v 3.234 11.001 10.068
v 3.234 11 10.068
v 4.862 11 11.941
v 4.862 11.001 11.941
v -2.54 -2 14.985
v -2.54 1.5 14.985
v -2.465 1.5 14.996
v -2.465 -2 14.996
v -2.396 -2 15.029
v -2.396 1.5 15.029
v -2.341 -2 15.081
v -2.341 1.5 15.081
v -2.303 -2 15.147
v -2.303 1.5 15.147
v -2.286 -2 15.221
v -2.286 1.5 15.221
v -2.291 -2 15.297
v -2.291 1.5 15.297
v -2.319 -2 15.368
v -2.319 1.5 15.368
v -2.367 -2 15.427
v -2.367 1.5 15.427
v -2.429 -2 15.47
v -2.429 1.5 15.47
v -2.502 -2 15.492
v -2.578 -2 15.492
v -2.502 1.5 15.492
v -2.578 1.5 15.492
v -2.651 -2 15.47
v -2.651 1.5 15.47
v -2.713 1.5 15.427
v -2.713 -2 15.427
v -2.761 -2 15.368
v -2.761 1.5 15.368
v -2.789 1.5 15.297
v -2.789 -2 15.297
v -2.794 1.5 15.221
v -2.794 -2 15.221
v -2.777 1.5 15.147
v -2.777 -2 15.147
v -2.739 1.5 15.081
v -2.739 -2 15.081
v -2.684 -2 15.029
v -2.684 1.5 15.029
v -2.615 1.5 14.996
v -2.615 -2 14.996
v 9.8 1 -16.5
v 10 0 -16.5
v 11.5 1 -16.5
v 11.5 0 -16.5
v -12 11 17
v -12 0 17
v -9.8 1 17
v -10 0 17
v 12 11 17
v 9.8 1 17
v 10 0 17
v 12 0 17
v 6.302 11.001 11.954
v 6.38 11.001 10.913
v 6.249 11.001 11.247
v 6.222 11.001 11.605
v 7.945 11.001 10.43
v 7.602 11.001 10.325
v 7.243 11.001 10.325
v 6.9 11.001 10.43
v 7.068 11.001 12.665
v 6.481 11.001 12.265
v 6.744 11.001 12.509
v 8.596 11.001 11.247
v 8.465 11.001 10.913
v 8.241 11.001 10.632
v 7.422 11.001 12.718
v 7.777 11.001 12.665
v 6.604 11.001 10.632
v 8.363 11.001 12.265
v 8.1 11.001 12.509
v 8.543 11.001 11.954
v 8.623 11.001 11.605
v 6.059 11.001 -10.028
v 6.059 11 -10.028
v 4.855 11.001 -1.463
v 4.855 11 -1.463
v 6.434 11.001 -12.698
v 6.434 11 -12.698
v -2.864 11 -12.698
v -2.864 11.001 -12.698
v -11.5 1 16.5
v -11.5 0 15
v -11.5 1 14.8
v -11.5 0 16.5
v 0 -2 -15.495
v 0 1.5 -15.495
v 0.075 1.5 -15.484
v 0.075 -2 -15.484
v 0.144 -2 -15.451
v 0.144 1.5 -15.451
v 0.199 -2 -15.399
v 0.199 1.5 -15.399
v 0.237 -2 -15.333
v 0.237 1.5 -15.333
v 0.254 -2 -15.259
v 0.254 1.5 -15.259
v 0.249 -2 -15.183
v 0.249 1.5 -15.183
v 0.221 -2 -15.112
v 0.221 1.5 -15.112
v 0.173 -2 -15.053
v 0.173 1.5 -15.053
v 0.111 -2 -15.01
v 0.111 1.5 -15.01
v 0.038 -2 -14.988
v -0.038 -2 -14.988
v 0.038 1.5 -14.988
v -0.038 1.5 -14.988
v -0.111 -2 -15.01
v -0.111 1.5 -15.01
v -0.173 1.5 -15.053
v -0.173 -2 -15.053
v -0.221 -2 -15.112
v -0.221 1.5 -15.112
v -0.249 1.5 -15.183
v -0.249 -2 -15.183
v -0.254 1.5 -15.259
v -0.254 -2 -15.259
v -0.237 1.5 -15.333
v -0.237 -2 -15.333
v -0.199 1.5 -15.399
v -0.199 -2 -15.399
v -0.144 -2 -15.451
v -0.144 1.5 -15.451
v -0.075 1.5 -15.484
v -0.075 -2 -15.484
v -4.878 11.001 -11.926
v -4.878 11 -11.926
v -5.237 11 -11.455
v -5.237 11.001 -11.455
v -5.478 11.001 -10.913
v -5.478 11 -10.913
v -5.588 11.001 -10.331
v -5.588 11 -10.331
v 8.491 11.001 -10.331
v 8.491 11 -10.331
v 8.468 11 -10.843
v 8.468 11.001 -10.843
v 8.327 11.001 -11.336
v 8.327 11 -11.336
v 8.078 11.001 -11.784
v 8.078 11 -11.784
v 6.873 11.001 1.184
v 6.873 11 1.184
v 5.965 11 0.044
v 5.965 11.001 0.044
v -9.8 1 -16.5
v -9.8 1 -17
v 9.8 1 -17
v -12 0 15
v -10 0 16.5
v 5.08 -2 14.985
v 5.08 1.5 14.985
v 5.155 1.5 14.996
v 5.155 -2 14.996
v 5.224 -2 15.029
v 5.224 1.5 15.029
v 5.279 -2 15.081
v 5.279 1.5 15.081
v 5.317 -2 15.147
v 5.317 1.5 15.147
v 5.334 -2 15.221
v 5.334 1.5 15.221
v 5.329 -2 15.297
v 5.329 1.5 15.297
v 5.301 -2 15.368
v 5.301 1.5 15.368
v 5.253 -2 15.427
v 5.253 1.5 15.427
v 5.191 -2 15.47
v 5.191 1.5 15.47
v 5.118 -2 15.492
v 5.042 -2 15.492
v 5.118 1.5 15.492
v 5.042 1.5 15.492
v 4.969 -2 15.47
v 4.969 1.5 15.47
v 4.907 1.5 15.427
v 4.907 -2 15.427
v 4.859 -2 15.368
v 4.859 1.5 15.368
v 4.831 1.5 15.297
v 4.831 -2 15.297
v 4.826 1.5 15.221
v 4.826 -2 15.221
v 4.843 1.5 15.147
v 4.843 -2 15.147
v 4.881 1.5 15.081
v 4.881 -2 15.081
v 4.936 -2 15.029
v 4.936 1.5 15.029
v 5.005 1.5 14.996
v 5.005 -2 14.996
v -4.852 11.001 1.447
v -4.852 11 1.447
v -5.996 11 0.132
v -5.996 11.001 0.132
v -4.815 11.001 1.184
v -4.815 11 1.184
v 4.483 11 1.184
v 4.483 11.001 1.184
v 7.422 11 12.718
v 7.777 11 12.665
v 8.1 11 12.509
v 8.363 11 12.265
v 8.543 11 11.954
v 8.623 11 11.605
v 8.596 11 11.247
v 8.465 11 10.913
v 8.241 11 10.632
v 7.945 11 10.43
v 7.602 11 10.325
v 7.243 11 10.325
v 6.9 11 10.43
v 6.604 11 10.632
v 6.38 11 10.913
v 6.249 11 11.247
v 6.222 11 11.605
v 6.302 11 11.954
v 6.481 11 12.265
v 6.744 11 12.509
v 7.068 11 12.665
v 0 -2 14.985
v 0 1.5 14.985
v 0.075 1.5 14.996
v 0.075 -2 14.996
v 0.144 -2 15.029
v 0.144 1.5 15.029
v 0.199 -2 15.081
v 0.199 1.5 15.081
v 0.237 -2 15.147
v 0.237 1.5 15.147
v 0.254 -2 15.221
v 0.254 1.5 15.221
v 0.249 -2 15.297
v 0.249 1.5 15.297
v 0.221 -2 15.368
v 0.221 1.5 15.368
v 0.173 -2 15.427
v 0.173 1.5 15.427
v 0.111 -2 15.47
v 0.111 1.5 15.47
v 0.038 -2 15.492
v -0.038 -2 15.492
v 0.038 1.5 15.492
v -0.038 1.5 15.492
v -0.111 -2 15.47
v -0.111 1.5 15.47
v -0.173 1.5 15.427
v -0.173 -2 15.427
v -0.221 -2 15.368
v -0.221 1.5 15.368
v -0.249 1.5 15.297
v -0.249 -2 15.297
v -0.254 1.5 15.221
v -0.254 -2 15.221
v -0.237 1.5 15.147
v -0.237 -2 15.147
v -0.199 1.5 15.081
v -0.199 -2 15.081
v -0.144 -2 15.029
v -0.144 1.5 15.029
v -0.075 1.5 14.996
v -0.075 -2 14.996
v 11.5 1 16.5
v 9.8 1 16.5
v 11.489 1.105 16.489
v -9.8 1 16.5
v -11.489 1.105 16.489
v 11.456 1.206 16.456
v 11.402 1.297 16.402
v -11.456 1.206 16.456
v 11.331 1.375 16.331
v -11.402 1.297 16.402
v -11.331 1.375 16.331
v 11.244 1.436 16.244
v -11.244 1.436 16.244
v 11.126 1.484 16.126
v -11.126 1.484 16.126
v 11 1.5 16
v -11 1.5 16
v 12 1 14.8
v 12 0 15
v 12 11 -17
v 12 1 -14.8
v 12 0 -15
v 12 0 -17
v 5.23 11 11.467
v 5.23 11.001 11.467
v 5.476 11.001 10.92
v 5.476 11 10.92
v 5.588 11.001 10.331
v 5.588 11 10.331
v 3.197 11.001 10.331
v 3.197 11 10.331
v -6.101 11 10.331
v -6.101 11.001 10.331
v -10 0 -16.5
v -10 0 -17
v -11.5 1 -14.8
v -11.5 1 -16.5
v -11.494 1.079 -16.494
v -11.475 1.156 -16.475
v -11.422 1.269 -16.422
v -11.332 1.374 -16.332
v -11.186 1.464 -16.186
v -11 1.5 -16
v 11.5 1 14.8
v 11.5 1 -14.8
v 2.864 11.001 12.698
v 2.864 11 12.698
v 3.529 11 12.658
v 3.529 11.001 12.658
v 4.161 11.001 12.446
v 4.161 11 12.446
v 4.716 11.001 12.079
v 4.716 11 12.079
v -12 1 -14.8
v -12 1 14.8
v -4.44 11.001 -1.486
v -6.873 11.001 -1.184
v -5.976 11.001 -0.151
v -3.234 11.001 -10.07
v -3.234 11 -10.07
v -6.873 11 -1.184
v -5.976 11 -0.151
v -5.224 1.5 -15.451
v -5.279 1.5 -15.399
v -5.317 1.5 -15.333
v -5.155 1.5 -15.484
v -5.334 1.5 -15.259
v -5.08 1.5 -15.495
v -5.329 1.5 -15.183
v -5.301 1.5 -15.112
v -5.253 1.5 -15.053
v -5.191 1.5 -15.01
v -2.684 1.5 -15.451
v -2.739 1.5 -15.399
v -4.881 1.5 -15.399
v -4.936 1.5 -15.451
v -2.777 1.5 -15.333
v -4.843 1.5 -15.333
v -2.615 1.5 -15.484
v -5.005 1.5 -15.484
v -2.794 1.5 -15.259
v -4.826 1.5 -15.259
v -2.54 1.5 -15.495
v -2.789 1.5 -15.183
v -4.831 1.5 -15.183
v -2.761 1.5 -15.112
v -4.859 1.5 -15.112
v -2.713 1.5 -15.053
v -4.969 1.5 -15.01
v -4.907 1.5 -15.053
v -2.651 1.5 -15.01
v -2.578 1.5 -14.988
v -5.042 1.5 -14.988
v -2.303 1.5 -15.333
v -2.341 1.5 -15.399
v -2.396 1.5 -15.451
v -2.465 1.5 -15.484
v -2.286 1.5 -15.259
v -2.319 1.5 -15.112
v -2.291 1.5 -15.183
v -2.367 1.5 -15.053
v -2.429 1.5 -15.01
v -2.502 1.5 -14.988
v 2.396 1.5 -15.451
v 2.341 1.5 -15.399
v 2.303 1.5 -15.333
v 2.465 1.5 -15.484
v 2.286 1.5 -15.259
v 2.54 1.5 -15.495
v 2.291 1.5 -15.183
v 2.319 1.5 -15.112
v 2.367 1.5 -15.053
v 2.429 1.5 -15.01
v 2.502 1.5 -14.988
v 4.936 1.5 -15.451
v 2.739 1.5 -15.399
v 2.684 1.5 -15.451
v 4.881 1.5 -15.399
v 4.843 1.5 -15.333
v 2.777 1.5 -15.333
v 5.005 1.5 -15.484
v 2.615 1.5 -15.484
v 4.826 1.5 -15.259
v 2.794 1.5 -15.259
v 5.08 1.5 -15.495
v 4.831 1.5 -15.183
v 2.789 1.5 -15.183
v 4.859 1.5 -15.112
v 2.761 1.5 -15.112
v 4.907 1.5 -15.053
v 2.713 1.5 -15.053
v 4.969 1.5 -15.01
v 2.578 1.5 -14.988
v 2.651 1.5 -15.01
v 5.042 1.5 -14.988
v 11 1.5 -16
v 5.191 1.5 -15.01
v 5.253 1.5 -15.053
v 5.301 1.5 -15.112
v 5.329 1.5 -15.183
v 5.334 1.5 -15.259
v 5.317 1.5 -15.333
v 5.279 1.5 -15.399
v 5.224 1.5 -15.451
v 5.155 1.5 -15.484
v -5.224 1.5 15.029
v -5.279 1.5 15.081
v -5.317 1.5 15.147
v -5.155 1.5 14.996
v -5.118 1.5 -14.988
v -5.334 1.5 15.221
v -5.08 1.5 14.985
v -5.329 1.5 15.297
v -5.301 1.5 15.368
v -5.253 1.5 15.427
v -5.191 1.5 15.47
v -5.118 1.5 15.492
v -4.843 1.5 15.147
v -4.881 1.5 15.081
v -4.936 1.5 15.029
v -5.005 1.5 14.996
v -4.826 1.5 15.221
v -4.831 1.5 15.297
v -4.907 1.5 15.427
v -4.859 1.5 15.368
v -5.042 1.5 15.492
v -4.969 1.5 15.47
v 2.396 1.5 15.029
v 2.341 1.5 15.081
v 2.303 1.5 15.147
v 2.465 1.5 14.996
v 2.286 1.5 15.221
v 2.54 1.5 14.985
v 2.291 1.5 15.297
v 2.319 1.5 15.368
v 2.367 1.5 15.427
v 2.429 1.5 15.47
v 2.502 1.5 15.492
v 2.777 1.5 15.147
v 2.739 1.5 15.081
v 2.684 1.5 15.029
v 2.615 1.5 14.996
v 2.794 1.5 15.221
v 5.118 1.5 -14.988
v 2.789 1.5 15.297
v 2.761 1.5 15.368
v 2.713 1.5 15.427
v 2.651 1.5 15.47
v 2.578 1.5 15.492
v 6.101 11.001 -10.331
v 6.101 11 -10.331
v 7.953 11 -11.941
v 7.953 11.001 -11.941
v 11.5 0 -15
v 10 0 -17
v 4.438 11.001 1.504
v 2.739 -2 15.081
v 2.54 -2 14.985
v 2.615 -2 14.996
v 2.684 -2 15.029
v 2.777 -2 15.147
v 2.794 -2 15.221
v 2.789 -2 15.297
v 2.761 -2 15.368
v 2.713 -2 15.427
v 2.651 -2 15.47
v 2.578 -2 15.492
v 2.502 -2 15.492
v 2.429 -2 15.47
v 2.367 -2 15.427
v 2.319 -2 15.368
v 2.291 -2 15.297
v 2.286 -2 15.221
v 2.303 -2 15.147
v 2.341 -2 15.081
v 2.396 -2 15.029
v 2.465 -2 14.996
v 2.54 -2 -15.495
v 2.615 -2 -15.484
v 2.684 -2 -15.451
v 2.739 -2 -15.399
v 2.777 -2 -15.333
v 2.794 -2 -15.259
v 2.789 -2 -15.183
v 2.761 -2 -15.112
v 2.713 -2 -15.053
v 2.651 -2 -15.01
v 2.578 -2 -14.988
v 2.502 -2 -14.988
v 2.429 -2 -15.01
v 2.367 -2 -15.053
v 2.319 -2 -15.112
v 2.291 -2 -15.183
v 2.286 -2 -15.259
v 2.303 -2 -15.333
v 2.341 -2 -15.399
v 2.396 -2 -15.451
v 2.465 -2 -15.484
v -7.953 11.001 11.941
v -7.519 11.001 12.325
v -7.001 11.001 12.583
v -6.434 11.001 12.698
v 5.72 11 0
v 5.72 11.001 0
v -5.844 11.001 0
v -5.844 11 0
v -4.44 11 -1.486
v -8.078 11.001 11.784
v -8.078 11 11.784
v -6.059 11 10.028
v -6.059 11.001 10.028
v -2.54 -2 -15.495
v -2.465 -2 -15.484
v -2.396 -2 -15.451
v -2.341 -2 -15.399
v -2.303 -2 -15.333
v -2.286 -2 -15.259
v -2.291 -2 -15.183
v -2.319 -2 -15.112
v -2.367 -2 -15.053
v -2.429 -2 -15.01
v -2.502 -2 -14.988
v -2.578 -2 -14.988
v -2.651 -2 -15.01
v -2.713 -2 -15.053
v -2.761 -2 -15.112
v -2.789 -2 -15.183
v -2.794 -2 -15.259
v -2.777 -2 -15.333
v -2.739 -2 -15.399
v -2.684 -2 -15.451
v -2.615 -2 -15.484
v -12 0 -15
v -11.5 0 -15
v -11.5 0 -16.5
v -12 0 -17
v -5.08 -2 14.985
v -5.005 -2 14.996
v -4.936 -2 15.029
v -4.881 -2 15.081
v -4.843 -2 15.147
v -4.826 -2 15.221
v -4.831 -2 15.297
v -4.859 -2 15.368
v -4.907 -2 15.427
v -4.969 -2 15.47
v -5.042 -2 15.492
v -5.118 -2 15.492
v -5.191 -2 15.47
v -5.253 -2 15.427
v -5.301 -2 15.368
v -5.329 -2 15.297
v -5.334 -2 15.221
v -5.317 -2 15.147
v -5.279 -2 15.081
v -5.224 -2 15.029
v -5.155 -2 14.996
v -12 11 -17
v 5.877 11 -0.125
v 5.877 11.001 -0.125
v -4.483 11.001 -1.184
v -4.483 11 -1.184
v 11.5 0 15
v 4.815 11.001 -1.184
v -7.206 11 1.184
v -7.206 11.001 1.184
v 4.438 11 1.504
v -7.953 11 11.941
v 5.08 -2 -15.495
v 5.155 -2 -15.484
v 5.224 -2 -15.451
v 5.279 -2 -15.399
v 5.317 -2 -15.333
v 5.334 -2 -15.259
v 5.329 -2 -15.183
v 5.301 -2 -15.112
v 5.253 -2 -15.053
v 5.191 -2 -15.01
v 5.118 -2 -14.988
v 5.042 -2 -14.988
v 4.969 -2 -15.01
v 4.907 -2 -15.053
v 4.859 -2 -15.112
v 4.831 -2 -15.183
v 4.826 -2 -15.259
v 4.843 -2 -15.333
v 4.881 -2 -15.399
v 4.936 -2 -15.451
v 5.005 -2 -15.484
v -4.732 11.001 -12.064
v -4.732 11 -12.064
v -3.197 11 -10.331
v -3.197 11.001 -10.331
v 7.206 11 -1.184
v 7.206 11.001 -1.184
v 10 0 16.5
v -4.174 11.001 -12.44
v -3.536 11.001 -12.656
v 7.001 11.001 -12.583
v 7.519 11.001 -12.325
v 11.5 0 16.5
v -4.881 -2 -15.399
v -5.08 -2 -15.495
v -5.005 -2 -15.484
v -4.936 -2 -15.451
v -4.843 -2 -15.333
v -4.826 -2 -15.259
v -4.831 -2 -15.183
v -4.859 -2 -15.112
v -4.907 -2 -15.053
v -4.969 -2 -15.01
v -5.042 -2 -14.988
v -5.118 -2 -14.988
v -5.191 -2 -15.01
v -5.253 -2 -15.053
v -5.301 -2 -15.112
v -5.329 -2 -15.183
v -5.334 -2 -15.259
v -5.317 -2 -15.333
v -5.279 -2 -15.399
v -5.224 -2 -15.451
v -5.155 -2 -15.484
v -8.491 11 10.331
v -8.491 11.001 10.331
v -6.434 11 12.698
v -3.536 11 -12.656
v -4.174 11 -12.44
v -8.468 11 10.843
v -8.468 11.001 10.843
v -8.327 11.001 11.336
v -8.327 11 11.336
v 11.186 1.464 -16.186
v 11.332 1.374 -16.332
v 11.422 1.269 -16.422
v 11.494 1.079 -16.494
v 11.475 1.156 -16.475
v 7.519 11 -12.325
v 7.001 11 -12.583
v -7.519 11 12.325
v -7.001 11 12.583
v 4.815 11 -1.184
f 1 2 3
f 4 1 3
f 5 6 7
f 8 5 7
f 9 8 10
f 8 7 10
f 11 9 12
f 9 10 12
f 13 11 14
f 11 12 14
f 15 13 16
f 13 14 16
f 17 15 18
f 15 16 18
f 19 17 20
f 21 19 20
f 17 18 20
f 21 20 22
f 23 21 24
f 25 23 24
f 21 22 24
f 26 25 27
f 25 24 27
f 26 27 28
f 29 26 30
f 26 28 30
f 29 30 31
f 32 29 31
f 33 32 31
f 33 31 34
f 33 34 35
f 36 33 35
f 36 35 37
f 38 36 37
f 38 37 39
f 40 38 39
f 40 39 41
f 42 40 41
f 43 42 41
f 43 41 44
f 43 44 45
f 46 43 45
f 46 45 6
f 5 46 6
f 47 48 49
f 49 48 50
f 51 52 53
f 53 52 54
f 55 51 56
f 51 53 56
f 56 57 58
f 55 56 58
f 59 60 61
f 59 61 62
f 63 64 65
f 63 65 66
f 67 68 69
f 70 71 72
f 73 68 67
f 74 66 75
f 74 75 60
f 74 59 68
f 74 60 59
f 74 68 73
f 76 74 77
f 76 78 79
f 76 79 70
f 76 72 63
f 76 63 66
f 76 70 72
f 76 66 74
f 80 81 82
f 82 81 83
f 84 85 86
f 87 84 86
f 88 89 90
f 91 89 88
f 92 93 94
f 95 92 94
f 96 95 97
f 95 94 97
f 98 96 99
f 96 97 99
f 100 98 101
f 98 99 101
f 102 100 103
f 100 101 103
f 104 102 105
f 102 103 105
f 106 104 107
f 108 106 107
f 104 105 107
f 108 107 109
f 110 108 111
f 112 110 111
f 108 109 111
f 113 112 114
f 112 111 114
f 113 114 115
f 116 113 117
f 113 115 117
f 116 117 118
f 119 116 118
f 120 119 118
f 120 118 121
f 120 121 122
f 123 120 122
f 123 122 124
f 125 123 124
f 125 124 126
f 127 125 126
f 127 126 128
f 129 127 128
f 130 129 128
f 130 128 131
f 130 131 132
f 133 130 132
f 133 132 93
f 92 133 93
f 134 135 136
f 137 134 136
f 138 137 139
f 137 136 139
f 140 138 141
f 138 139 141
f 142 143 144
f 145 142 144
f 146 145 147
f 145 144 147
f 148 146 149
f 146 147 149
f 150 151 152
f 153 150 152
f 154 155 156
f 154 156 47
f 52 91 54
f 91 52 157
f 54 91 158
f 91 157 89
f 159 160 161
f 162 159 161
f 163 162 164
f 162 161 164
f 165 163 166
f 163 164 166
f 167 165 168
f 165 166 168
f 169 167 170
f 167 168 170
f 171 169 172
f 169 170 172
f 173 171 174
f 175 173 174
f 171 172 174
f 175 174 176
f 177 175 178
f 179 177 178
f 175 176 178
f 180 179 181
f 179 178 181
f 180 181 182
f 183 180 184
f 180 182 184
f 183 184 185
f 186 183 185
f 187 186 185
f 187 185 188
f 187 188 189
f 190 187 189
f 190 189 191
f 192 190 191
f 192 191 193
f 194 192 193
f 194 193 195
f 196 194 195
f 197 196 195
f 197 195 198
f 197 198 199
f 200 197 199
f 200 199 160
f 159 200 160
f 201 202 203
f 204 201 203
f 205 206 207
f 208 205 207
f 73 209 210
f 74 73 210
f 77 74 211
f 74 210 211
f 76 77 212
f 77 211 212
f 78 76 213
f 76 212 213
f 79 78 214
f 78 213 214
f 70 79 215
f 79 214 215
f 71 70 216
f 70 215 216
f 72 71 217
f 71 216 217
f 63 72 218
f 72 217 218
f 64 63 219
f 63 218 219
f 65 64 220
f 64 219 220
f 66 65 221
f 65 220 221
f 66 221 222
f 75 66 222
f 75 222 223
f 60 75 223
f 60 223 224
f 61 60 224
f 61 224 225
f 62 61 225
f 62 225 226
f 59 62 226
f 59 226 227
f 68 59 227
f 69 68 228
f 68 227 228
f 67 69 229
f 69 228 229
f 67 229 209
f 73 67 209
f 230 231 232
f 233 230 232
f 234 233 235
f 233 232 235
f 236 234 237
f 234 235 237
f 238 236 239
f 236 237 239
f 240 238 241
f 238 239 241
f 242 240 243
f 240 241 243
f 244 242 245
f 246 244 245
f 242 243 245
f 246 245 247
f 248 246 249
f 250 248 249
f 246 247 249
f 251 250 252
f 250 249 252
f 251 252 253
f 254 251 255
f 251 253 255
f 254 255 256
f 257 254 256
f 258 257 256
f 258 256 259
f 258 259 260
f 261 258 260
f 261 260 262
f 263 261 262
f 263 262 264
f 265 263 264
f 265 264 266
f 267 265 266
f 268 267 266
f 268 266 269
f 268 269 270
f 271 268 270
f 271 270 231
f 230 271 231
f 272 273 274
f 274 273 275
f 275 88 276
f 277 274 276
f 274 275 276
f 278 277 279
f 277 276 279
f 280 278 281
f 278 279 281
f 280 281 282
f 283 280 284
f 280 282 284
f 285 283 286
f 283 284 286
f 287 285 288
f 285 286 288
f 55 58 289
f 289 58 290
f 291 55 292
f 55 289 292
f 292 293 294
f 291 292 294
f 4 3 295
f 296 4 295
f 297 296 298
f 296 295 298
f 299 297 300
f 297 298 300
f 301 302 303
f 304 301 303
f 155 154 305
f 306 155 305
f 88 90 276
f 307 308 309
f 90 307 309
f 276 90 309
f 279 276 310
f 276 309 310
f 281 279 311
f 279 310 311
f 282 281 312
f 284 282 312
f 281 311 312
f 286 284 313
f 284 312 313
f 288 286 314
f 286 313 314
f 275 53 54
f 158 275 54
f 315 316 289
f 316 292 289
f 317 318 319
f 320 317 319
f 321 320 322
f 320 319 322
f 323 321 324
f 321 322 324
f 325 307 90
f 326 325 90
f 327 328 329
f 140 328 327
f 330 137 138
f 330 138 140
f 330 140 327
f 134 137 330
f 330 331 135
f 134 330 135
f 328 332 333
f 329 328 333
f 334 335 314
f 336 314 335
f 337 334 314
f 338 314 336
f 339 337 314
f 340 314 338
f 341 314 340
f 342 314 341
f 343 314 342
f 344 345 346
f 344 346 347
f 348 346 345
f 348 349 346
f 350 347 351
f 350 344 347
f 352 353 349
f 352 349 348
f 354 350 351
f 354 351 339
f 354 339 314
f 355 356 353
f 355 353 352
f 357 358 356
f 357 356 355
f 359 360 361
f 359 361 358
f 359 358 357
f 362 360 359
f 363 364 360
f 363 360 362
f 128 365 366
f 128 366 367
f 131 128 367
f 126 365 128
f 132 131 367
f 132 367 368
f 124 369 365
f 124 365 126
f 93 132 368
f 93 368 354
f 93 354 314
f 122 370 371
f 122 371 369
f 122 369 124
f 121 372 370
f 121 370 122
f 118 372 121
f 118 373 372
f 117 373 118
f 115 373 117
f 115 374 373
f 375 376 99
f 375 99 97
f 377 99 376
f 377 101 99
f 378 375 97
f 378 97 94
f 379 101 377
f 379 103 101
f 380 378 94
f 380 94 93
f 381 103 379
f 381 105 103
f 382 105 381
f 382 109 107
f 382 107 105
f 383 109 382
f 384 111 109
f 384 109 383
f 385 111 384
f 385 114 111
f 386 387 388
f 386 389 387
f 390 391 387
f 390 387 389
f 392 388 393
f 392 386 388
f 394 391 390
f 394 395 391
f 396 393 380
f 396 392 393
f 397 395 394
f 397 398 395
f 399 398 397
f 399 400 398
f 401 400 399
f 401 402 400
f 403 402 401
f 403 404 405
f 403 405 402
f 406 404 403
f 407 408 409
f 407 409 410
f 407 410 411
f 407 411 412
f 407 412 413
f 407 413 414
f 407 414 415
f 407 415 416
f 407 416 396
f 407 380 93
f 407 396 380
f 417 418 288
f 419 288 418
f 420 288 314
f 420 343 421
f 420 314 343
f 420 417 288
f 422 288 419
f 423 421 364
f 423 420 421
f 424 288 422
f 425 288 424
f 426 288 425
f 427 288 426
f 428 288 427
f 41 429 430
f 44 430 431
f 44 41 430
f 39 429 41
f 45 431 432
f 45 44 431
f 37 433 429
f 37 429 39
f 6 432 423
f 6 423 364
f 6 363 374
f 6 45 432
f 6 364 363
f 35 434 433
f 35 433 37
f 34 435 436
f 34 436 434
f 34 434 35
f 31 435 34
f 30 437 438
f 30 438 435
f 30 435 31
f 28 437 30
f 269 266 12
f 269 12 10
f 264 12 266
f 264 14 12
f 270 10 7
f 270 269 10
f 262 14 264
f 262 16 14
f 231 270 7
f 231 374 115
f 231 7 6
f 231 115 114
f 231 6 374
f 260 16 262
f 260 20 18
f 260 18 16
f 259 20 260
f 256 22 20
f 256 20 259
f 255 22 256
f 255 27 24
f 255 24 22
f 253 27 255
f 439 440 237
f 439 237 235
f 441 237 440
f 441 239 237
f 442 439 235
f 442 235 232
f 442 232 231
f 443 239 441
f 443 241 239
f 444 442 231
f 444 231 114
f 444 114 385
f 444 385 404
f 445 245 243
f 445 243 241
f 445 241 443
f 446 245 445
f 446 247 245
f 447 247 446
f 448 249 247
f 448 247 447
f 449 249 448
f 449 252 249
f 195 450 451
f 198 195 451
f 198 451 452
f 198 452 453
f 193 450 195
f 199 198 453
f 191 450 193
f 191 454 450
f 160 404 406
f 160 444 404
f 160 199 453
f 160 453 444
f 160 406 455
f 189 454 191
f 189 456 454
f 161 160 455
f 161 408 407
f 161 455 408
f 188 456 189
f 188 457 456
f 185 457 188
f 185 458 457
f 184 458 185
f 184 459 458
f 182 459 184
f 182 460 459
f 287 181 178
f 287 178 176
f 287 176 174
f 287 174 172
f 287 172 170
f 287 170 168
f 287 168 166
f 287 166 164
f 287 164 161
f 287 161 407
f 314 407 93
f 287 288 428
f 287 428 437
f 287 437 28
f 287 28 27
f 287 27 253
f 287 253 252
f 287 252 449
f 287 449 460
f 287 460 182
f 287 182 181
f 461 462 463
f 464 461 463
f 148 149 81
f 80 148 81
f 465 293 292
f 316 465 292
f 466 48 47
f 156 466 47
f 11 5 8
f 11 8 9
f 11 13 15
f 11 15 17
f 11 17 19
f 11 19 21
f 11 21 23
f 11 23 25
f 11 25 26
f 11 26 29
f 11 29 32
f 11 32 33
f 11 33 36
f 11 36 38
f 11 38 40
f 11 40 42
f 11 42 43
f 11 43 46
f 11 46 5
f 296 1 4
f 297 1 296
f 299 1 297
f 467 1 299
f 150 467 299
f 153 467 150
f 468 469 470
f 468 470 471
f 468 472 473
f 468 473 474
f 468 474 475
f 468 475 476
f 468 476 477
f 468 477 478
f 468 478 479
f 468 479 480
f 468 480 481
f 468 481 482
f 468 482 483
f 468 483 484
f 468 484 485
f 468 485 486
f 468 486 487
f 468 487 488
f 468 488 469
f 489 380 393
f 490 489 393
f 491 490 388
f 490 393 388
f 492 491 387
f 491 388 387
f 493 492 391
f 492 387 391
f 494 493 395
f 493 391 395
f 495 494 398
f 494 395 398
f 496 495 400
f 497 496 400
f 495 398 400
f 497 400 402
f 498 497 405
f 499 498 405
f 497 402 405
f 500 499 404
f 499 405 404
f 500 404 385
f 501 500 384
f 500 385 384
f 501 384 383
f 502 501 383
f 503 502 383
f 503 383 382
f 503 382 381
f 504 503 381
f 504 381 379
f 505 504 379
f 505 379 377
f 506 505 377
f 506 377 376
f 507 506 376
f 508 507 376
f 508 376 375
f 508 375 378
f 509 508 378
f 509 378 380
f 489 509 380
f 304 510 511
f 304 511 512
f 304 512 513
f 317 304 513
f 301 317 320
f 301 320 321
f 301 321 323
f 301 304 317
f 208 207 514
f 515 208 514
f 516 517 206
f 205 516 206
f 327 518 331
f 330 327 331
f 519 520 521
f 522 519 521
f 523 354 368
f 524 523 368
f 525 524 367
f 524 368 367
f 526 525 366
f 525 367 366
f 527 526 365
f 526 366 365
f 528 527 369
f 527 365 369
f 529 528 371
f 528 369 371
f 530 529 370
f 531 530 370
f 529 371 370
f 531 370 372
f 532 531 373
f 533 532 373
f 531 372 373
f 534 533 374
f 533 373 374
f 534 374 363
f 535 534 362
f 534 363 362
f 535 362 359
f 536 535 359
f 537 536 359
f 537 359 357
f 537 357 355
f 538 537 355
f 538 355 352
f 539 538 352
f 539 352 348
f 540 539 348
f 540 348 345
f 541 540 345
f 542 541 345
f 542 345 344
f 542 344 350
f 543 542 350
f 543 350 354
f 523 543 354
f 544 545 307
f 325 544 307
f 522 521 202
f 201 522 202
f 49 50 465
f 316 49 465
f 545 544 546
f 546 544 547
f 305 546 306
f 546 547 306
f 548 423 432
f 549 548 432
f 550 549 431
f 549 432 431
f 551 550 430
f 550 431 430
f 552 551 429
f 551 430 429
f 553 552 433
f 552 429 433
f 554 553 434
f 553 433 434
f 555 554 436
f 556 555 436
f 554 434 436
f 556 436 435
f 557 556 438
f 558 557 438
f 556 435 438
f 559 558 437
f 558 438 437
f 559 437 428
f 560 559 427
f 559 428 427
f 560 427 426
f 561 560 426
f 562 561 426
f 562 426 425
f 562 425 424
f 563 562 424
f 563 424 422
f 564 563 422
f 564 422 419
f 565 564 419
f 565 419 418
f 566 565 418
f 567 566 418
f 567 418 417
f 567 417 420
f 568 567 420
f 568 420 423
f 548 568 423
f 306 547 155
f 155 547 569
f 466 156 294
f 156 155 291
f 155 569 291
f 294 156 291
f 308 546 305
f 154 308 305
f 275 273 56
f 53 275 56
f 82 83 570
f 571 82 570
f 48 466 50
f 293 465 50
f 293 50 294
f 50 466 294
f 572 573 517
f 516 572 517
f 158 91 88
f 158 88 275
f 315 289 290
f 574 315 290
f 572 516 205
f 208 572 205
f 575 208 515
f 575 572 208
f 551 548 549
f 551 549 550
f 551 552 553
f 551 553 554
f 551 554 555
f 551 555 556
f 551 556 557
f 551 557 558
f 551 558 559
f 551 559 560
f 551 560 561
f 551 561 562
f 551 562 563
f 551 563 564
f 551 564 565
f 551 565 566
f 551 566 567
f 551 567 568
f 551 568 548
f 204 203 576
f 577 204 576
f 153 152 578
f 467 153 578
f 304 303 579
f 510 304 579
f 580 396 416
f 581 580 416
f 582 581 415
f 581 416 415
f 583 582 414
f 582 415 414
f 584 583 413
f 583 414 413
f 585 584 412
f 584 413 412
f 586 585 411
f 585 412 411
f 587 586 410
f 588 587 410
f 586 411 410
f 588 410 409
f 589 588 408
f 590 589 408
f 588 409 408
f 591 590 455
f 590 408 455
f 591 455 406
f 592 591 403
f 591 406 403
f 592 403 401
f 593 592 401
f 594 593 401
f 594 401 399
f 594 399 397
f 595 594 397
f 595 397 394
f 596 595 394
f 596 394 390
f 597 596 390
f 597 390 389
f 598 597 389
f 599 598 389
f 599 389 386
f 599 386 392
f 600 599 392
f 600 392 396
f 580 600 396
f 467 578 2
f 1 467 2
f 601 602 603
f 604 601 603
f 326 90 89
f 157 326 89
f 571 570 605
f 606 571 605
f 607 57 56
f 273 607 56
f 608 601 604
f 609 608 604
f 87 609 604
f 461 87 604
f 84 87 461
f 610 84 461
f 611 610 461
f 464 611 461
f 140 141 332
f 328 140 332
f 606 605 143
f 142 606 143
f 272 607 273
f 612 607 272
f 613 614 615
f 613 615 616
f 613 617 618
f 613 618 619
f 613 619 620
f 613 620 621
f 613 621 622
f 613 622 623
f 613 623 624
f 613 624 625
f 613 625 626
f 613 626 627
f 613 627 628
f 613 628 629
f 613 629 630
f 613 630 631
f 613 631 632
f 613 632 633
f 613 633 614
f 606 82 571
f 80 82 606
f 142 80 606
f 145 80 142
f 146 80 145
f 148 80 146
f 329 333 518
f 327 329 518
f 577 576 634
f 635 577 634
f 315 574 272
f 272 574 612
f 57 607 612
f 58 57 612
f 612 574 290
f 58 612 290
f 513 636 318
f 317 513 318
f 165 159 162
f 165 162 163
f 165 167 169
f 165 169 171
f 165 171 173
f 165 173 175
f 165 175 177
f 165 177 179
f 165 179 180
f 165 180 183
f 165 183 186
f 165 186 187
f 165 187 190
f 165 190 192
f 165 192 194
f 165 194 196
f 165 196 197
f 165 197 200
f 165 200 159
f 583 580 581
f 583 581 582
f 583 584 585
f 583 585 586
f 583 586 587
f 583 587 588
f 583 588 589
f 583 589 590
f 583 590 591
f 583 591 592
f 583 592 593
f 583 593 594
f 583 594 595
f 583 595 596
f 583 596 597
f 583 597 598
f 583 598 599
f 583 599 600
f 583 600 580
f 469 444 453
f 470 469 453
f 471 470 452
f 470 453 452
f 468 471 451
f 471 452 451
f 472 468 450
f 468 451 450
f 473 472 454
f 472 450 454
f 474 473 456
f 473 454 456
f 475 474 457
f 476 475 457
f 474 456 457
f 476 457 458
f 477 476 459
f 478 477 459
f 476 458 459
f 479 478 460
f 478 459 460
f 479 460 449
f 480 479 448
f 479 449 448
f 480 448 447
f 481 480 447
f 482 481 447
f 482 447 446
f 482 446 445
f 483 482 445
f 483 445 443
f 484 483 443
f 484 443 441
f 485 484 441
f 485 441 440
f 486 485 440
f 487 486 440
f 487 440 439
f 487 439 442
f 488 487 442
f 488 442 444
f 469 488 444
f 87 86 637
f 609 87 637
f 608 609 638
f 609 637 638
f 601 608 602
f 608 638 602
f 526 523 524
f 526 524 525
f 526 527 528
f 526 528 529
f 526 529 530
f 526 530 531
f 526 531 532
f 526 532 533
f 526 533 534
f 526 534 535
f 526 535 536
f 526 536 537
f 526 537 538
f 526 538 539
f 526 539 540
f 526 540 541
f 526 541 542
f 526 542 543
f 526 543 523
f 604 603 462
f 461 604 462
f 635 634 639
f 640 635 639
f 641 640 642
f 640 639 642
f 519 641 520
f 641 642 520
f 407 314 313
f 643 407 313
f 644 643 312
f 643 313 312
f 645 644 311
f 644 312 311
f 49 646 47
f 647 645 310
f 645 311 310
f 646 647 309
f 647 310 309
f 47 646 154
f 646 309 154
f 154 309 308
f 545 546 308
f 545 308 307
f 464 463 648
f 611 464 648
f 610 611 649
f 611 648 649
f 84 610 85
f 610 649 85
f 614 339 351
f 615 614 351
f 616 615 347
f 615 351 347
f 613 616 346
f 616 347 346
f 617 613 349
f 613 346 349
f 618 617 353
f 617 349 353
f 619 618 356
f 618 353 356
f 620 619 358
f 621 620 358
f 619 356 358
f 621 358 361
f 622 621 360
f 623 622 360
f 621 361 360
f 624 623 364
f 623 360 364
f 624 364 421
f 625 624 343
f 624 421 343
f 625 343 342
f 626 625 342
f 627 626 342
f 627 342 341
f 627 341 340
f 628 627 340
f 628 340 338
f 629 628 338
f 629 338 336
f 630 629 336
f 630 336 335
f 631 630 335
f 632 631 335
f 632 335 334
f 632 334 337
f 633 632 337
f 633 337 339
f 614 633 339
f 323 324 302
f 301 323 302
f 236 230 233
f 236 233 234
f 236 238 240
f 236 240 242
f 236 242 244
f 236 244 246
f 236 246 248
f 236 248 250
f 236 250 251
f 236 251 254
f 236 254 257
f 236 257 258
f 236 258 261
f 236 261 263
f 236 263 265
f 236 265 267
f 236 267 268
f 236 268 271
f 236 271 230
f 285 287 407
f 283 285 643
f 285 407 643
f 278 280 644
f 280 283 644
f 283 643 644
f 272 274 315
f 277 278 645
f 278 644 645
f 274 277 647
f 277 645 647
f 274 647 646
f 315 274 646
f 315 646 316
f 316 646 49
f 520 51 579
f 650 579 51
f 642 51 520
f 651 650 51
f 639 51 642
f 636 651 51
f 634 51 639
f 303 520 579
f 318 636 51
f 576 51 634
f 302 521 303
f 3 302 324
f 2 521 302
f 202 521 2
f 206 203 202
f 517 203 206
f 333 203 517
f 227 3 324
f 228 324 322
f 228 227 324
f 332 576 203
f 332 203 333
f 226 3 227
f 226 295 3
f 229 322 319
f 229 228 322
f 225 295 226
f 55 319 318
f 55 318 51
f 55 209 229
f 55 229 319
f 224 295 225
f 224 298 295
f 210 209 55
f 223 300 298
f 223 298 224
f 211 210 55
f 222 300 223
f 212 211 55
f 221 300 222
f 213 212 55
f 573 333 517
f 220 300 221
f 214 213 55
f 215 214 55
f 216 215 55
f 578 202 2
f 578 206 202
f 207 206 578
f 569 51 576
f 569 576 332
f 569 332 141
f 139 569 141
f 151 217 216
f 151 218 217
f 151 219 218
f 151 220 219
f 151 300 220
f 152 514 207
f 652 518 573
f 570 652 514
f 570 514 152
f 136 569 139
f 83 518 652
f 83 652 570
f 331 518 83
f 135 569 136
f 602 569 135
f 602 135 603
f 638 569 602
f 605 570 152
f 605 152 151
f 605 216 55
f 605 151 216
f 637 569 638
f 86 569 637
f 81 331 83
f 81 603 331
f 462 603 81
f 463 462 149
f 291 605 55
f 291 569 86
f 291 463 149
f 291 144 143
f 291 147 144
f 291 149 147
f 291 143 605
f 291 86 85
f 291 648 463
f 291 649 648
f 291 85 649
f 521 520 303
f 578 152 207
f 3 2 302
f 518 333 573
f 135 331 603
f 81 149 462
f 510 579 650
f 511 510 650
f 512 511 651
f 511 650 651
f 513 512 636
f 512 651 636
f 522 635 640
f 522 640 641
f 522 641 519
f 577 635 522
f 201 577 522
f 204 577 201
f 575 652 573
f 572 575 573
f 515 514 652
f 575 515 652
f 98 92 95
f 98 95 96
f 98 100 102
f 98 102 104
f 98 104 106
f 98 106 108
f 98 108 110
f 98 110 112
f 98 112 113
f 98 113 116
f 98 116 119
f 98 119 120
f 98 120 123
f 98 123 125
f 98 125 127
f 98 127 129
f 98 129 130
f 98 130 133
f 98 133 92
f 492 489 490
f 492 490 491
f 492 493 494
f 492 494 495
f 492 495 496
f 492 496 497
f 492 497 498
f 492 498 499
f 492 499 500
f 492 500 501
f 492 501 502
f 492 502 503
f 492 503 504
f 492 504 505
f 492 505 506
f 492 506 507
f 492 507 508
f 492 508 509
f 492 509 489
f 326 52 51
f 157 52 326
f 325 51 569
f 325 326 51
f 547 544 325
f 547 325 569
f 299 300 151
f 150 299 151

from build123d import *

# Parameters (mm, degrees)
SKETCH1_W                = 24
SKETCH1_H                = 34
BOSS_EXTRUDE1_DEPTH      = 11
CUT_EXTRUDE1_DEPTH       = 32.400636936
CUT_EXTRUDE2_DEPTH       = 38.69615365
SKETCH5_W                = 23
SKETCH5_H                = 33
CUT_EXTRUDE3_DEPTH       = 1.5
FILLET1_START            = -11.5
FILLET1_DEPTH            = 23
FILLET1_START_2          = -17
FILLET1_2_DEPTH          = 34
BOSS_EXTRUDE3_DEPTH      = 2
BOSS_EXTRUDE3_DEPTH_BACK = 2
SKETCH6_R                = 0.255
SKETCH8_R                = 1.203626853
BOSS_EXTRUDE4_DEPTH      = 0.001


with BuildPart() as part:
    # Sketch1 → Boss-Extrude1 (new body)
    with BuildSketch(Plane(origin=(0, 0, 0), x_dir=(1, 0, 0), z_dir=(0, 1, 0))):
        Rectangle(SKETCH1_W, SKETCH1_H)
    extrude(amount=BOSS_EXTRUDE1_DEPTH)

    # Sketch2 → Cut-Extrude1 (cut, through all)
    with BuildSketch(Plane(origin=(12, 0, 0), x_dir=(0, 0, -1), z_dir=(1, 0, 0))):
        Polygon((14.8, 1), (-14.8, 1), (-15, 0), (-15, -1), (15, -1), (15, 0), align=None)
    extrude(amount=-CUT_EXTRUDE1_DEPTH, mode=Mode.SUBTRACT)

    # Sketch3 → Cut-Extrude2 (cut, through all)
    with BuildSketch(Plane.XY.offset(17)):
        Polygon((9.8, 1), (-9.8, 1), (-10, 0), (-10, -1), (10, -1), (10, 0), align=None)
    extrude(amount=-CUT_EXTRUDE2_DEPTH, mode=Mode.SUBTRACT)

    # Sketch5 → Cut-Extrude3 (cut)
    with BuildSketch(Plane.XZ):
        Rectangle(SKETCH5_W, SKETCH5_H)
    extrude(amount=-CUT_EXTRUDE3_DEPTH, mode=Mode.SUBTRACT)

    # Fillet1: read off the stored shape, not the designer's step
    # Fillet1 outline → Fillet1 (add)
    with BuildSketch(Plane.YZ.offset(FILLET1_START)):
        with BuildLine():
            Line((1.5, 16.5), (1, 16.5))
            ThreePointArc((1, 16.5), (1.353553391, 16.353553391), (1.5, 16))
            Line((1.5, 16), (1.5, 16.5))
        make_face()
        with BuildLine():
            Line((1.5, -16.5), (1.5, -16))
            ThreePointArc((1.5, -16), (1.353553391, -16.353553391), (1, -16.5))
            Line((1, -16.5), (1.5, -16.5))
        make_face()
    extrude(amount=FILLET1_DEPTH)

    # Fillet1 2 outline → Fillet1 2 (add)
    with BuildSketch(Plane.XY.offset(FILLET1_START_2)):
        with BuildLine():
            Line((-11.5, 1.5), (-11.5, 1))
            ThreePointArc((-11.5, 1), (-11.353553391, 1.353553391), (-11, 1.5))
            Line((-11, 1.5), (-11.5, 1.5))
        make_face()
        with BuildLine():
            Line((11.5, 1.5), (11, 1.5))
            ThreePointArc((11, 1.5), (11.353553391, 1.353553391), (11.5, 1))
            Line((11.5, 1), (11.5, 1.5))
        make_face()
    extrude(amount=FILLET1_2_DEPTH)

    # Sketch6 → Boss-Extrude3 (add, two sides: drawn at the far end of the back side and taken through both)
    with BuildSketch(Plane.XZ.offset(-BOSS_EXTRUDE3_DEPTH_BACK)):
        with Locations(Location((0, 15.24, 0), (0, 0, 270))):
            Circle(SKETCH6_R)
        with Locations(Location((2.54, 15.24, 0), (0, 0, 270))):
            Circle(SKETCH6_R)
        with Locations(Location((5.08, 15.24, 0), (0, 0, 270))):
            Circle(SKETCH6_R)
        with Locations(Location((-5.08, 15.24, 0), (0, 0, 270))):
            Circle(SKETCH6_R)
        with Locations(Location((-2.54, 15.24, 0), (0, 0, 270))):
            Circle(SKETCH6_R)
        with Locations(Location((-2.54, -15.24, 0), (0, 0, 270))):
            Circle(SKETCH6_R)
        with Locations(Location((-5.08, -15.24, 0), (0, 0, 270))):
            Circle(SKETCH6_R)
        with Locations(Location((5.08, -15.24, 0), (0, 0, 270))):
            Circle(SKETCH6_R)
        with Locations(Location((2.54, -15.24, 0), (0, 0, 270))):
            Circle(SKETCH6_R)
        with Locations(Location((0, -15.24, 0), (0, 0, 270))):
            Circle(SKETCH6_R)
    extrude(amount=BOSS_EXTRUDE3_DEPTH + BOSS_EXTRUDE3_DEPTH_BACK)

    # Sketch8 → Boss-Extrude4 (add)
    with BuildSketch(Plane(origin=(0, 11, 0), x_dir=(1, 0, 0), z_dir=(0, 1, 0))):
        with Locations(Location((7.422365596, -11.514696897, 0), (0, 0, 270))):
            Circle(SKETCH8_R)
        with BuildLine():
            Line((4.437710207, -1.50424181), (3.234164607, -10.067913736))
            Line((3.234164607, -10.067913736), (4.862495803, -11.941094501))
            ThreePointArc((4.862495803, -11.941094501), (5.368748257, -11.200837396), (5.587567885, -10.331130491))
            Line((5.587567885, -10.331130491), (6.873174177, -1.183566406))
            Line((6.873174177, -1.183566406), (5.964953485, -0.043665222))
            Line((5.964953485, -0.043665222), (4.437710207, -1.50424181))
        make_face()
        with BuildLine():
            Line((5.877292712, 0.125030841), (7.205852999, 1.183566406))
            Line((7.205852999, 1.183566406), (8.491459291, 10.331130491))
            ThreePointArc((8.491459291, 10.331130491), (8.411955198, 11.093627172), (8.077597236, 11.783501683))
            Line((8.077597236, 11.783501683), (6.058508073, 10.028334252))
            Line((6.058508073, 10.028334252), (4.854667192, 1.462561294))
            Line((4.854667192, 1.462561294), (5.877292712, 0.125030841))
        make_face()
        with BuildLine():
            Line((6.10106331, 10.331130491), (7.952849968, 11.940864075))
            ThreePointArc((7.952849968, 11.940864075), (7.268624086, 12.470648357), (6.433742131, 12.698263303))
            Line((6.433742131, 12.698263303), (-2.864493083, 12.698263303))
            ThreePointArc((-2.864493083, 12.698263303), (-3.862201278, 12.569201297), (-4.732453708, 12.064484197))
            Line((-4.732453708, 12.064484197), (-3.197171904, 10.331130491))
            Line((-3.197171904, 10.331130491), (6.10106331, 10.331130491))
        make_face()
        Polygon((-4.815457018, -1.183566406), (4.482778196, -1.183566406), (5.720367413, 0), (4.815457018, 1.183566406), (-4.482778196, 1.183566406), (-5.844315597, 0), align=None)
        with BuildLine():
            Line((-5.975923975, 0.15139812), (-4.44022296, 1.486362645))
            Line((-4.44022296, 1.486362645), (-3.233869851, 10.07001103))
            Line((-3.233869851, 10.07001103), (-4.877500084, 11.925691561))
            ThreePointArc((-4.877500084, 11.925691561), (-5.373142616, 11.19102491), (-5.587567885, 10.331130491))
            Line((-5.587567885, 10.331130491), (-6.873174177, 1.183566406))
            Line((-6.873174177, 1.183566406), (-5.975923975, 0.15139812))
        make_face()
        with BuildLine():
            Line((-5.995713717, -0.131608377), (-7.205852999, -1.183566406))
            Line((-7.205852999, -1.183566406), (-8.491459291, -10.331130491))
            ThreePointArc((-8.491459291, -10.331130491), (-8.411955198, -11.093627172), (-8.077597236, -11.783501683))
            Line((-8.077597236, -11.783501683), (-6.058508073, -10.028334252))
            Line((-6.058508073, -10.028334252), (-4.85244972, -1.446783161))
            Line((-4.85244972, -1.446783161), (-5.995713717, -0.131608377))
        make_face()
        with BuildLine():
            Line((-6.10106331, -10.331130491), (-7.952849968, -11.940864075))
            ThreePointArc((-7.952849968, -11.940864075), (-7.268624086, -12.470648357), (-6.433742131, -12.698263303))
            Line((-6.433742131, -12.698263303), (2.864493083, -12.698263303))
            ThreePointArc((2.864493083, -12.698263303), (3.852009379, -12.572635363), (4.716279741, -12.078664154))
            Line((4.716279741, -12.078664154), (3.197171904, -10.331130491))
            Line((3.197171904, -10.331130491), (-6.10106331, -10.331130491))
        make_face()
    extrude(amount=BOSS_EXTRUDE4_DEPTH)


solid = part.part
